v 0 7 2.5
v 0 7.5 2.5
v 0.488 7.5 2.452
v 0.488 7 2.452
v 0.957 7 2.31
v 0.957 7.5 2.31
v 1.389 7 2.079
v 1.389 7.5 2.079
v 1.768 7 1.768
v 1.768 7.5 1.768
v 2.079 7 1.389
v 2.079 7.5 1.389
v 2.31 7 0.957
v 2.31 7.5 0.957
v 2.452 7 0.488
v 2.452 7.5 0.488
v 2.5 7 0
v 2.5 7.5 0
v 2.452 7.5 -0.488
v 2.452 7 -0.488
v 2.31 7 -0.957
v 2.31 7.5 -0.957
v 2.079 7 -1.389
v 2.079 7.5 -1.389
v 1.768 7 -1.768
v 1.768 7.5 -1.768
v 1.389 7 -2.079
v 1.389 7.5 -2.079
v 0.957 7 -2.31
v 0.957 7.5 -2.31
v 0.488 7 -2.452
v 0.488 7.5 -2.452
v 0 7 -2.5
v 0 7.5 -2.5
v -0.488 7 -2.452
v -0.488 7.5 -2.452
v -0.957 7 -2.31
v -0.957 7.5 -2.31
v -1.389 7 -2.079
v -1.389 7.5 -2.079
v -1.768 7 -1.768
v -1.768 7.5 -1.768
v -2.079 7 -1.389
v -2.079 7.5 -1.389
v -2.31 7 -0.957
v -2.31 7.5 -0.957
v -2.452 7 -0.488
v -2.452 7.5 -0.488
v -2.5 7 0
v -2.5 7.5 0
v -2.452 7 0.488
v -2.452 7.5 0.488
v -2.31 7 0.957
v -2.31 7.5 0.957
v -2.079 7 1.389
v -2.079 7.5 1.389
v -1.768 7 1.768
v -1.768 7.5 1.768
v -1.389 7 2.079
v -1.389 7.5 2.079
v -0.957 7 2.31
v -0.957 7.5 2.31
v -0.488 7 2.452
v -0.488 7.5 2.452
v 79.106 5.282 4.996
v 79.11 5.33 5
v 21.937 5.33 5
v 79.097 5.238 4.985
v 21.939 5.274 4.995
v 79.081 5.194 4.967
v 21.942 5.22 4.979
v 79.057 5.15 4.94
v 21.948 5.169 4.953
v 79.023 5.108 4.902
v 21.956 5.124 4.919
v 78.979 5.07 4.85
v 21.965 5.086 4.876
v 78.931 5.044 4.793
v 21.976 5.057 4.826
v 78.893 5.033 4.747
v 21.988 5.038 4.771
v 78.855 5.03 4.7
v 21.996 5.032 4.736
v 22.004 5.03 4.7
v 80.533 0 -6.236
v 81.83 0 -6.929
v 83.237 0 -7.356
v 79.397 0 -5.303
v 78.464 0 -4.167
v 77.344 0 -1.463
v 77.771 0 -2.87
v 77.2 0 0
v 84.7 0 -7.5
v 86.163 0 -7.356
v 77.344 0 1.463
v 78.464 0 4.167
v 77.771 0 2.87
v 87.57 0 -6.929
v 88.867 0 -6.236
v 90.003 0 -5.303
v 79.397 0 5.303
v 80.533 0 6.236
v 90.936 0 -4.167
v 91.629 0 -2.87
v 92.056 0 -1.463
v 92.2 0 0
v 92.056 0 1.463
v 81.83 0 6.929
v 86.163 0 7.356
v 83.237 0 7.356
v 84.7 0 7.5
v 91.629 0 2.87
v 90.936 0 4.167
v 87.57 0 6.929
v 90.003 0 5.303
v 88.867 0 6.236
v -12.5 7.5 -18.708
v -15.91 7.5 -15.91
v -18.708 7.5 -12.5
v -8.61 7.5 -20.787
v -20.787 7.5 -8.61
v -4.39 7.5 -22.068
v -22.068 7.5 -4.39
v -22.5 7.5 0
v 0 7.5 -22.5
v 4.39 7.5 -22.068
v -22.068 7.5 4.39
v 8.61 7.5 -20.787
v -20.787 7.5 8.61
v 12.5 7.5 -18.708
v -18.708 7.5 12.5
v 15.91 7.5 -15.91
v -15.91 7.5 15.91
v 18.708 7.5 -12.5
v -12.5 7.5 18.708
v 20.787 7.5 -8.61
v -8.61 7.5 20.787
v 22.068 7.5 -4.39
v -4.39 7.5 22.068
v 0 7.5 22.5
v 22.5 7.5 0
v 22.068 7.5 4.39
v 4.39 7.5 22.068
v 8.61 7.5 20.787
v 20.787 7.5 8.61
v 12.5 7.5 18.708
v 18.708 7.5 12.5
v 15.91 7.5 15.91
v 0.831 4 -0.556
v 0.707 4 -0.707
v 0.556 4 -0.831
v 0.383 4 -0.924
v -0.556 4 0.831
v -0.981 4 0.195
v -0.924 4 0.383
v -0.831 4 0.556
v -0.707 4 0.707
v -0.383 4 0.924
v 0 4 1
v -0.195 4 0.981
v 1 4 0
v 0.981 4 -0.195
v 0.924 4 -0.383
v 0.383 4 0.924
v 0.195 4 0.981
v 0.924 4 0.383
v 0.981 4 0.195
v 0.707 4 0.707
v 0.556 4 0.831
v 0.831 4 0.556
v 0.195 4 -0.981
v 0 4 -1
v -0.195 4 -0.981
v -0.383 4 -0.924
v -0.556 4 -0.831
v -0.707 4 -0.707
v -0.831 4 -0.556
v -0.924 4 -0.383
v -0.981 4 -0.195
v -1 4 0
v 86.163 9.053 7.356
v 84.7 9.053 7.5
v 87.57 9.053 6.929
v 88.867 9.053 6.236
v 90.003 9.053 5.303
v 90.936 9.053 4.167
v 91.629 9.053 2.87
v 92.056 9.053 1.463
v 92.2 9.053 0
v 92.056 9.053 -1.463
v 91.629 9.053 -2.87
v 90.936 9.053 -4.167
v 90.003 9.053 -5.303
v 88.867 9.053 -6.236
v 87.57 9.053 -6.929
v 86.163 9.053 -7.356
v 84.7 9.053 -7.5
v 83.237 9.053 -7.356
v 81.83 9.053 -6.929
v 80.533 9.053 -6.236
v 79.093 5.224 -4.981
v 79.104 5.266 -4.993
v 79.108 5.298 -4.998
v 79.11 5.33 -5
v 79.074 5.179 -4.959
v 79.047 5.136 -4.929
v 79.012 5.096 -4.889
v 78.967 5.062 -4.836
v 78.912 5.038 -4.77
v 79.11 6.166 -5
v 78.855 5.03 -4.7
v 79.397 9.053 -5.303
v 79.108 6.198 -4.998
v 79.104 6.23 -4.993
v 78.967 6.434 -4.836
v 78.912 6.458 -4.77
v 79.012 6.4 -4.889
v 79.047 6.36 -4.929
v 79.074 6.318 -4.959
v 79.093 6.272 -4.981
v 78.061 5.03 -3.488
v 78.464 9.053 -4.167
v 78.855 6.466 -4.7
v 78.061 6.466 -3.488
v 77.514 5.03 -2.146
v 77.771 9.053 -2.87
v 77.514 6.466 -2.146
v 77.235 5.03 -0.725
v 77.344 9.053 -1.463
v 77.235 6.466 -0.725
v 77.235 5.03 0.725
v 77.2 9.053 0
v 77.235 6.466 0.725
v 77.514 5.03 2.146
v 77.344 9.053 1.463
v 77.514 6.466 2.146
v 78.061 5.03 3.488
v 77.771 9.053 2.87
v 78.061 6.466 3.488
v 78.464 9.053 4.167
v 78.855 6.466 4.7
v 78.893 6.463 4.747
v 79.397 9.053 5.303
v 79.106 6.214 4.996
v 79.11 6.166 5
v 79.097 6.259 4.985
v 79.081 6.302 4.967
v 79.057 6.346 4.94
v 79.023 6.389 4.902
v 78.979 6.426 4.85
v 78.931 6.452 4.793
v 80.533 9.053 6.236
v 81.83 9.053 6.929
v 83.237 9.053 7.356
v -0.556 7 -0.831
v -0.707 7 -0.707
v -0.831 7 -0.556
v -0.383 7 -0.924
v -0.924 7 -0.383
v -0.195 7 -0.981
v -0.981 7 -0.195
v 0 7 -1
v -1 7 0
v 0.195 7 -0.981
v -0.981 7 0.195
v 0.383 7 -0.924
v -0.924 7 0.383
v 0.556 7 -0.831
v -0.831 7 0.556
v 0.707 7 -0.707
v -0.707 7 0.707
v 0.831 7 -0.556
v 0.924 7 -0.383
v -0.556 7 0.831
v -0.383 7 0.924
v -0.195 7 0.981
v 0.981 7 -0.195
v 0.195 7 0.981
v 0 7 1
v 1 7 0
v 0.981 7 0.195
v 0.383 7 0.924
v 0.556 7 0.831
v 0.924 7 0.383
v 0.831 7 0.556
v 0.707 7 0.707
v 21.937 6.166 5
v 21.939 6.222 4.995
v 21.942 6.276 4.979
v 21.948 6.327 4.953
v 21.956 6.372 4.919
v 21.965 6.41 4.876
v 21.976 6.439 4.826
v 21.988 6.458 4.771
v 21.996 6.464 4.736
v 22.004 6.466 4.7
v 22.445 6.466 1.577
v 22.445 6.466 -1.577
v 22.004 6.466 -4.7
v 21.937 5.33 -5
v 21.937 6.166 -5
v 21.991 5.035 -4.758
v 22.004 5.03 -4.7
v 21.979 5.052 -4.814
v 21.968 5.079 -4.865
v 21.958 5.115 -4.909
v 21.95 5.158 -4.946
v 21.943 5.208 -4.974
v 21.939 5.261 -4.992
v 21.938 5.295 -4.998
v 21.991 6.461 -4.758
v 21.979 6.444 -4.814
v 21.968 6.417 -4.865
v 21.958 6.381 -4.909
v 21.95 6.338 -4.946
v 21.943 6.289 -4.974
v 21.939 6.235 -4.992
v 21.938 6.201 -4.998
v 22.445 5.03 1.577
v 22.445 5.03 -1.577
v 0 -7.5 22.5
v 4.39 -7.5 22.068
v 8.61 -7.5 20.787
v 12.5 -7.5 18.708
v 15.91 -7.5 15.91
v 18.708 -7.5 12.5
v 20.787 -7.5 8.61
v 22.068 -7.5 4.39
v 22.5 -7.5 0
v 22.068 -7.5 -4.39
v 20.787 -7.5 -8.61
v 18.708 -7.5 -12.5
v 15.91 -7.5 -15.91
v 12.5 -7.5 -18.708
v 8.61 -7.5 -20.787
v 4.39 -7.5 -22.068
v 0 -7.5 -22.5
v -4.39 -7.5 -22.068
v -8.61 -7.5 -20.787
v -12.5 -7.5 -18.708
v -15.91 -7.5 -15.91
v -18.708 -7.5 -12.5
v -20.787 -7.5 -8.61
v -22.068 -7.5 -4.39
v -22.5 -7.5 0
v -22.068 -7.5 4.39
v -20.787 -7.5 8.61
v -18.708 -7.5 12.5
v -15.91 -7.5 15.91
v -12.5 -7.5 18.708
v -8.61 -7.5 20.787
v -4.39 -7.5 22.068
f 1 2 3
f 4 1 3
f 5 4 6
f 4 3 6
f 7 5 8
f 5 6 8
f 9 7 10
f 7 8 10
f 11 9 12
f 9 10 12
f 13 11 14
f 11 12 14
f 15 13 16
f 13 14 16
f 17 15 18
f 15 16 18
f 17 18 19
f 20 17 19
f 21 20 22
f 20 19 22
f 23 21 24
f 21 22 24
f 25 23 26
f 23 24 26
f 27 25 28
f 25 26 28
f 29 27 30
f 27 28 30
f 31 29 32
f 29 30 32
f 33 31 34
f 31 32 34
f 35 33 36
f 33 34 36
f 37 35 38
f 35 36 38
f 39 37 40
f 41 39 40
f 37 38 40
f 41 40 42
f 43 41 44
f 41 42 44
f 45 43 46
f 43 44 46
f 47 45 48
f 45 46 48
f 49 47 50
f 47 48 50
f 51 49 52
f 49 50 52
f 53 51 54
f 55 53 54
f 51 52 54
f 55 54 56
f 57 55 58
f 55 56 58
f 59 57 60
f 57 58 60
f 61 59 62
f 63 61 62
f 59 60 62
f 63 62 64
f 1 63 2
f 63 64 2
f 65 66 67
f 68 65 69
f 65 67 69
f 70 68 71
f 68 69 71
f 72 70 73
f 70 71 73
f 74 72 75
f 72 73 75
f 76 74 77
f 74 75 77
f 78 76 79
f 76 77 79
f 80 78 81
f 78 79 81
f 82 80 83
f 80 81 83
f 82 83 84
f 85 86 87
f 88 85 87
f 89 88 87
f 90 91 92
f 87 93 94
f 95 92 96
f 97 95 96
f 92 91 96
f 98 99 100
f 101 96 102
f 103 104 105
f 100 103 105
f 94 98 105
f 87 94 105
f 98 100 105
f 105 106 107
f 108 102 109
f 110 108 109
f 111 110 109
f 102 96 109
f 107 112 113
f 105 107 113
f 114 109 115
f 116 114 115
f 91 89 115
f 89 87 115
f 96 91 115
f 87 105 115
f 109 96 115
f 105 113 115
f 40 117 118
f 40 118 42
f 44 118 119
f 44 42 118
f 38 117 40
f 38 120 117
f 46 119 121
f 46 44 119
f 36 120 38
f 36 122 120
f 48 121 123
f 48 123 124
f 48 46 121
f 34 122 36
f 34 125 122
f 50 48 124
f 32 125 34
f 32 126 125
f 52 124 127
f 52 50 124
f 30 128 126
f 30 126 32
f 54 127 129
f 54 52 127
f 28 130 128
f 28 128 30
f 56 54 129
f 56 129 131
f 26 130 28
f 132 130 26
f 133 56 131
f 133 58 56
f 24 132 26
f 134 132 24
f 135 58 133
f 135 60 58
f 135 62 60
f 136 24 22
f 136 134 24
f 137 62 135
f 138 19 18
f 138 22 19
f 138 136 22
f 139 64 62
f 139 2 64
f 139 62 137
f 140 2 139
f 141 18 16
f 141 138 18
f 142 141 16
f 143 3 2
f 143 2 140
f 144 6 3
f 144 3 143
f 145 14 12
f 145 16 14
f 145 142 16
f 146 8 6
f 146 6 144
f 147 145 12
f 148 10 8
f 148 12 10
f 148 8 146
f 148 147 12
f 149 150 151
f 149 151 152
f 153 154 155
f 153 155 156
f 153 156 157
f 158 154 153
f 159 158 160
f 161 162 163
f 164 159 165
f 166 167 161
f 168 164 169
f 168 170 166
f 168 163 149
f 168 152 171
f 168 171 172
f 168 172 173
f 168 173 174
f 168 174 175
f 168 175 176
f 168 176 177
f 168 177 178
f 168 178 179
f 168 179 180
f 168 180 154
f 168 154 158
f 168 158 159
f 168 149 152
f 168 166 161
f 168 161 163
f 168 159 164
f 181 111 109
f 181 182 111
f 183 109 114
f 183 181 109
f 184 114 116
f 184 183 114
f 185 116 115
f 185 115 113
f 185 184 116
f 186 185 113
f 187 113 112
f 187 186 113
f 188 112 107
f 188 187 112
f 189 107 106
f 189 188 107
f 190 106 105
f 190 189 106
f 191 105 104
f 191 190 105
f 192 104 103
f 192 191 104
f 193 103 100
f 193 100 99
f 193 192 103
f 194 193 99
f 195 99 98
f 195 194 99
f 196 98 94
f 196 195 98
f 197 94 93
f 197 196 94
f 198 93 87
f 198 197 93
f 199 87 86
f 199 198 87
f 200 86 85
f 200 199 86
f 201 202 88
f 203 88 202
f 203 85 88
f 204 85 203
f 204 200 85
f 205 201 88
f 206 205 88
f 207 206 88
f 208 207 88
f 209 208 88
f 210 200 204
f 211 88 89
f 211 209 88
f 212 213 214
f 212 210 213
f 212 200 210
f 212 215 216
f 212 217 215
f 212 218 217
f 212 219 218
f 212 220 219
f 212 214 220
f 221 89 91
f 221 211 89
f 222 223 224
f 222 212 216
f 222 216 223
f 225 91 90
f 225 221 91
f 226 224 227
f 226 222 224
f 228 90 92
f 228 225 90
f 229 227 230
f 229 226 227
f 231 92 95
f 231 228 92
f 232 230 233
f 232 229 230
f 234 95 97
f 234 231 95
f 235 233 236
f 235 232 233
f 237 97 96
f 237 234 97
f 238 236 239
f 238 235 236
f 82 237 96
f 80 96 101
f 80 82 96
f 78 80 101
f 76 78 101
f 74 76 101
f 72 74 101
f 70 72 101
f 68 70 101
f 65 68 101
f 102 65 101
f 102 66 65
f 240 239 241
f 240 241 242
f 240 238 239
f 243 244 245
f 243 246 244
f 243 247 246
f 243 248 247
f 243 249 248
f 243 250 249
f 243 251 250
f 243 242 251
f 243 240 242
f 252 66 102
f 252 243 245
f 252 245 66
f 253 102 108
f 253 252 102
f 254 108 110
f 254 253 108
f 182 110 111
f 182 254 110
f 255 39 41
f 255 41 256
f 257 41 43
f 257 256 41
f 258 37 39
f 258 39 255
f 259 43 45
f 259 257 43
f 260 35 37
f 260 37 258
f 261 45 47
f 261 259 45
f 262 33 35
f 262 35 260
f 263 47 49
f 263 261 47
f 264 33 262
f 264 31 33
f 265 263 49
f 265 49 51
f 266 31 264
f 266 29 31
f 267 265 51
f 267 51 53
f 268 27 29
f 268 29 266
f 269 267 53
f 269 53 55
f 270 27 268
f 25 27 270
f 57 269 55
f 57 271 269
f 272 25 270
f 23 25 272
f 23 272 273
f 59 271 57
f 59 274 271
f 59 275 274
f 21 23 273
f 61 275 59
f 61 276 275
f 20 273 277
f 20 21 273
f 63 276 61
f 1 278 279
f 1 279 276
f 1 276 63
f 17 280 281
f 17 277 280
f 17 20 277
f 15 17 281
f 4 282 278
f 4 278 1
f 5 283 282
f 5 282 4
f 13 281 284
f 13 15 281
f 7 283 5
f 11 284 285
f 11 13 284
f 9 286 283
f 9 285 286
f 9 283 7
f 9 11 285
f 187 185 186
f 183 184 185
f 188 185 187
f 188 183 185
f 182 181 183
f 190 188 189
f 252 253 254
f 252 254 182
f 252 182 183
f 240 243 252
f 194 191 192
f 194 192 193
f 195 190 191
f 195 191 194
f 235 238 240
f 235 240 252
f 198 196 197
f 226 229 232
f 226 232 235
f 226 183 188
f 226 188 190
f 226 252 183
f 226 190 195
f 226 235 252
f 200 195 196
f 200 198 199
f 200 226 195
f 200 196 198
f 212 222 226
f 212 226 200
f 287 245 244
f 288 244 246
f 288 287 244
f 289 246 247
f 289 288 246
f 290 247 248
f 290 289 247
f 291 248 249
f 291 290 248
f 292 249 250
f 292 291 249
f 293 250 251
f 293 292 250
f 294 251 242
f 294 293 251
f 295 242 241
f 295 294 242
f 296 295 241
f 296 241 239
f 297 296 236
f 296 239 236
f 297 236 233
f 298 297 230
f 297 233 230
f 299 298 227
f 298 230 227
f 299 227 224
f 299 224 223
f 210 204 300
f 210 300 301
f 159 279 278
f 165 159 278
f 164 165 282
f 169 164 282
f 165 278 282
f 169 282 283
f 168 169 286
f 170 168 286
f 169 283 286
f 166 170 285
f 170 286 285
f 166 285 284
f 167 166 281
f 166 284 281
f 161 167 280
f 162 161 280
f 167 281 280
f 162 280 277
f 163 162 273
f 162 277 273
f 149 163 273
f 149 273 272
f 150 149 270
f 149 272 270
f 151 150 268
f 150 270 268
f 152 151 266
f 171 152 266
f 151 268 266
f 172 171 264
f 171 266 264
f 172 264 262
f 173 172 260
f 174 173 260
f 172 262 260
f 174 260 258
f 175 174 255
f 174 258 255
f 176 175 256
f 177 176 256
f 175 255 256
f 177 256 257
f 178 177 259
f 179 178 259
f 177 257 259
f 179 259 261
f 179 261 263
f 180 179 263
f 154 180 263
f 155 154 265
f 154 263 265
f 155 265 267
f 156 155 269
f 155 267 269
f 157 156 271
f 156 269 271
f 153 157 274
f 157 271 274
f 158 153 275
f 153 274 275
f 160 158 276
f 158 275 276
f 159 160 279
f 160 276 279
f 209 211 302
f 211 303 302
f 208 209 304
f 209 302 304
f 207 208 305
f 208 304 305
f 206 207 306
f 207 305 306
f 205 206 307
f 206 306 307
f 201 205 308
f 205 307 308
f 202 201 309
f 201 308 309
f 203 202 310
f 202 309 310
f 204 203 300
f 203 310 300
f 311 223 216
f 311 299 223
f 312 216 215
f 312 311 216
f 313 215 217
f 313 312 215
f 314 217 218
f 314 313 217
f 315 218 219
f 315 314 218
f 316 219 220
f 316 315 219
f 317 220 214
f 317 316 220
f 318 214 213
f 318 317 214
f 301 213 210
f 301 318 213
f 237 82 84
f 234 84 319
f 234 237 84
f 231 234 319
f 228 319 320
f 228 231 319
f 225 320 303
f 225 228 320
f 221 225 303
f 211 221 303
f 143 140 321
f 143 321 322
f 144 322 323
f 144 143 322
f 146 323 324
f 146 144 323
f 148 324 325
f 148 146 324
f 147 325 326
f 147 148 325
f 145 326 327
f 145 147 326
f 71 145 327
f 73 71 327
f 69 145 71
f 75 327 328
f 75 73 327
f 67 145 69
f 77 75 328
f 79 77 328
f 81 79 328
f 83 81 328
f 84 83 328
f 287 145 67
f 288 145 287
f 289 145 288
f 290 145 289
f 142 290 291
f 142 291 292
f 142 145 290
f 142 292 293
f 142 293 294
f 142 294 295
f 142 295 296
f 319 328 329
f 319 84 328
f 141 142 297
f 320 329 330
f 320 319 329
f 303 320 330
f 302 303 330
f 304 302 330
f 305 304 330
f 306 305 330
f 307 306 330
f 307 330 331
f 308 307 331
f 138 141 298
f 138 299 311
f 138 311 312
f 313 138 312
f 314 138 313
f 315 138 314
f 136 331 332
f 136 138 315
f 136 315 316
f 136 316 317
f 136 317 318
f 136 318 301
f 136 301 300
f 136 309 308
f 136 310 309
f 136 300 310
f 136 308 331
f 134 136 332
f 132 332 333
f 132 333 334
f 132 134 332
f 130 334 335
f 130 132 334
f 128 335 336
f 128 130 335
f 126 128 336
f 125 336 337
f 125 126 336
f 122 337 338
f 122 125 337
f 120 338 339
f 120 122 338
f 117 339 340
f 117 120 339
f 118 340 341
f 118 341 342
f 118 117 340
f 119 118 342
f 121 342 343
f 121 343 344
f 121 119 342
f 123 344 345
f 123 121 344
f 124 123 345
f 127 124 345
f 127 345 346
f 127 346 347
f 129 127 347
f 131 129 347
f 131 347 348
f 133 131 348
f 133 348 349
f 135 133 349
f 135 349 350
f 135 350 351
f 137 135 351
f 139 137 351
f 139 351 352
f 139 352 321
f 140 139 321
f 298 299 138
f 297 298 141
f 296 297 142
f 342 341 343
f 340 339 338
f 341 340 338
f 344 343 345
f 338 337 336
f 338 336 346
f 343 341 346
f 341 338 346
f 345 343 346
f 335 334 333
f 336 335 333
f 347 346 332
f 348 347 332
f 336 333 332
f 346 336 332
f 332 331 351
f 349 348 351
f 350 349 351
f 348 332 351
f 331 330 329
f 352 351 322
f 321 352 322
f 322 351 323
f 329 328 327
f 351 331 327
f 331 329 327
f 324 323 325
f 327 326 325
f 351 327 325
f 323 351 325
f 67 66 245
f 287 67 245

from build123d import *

# Parameters (mm, degrees)
SKETCH_1_R           = 22.5
EXTRUDE_1_DEPTH      = 7.5
SKETCH_3_R           = 7.5
EXTRUDE_2_DEPTH      = 7.5
SKETCH_4_W           = 23.480524837
SKETCH_4_H           = 9.129078989
CUT_EXTRUDE_2_DEPTH  = 97.083765538
EXTRUDE_3_REACH      = 113.978
EXTRUDE_3_END_RADIUS = 22.5
SKETCH_5_W           = 10
SKETCH_5_H           = 1.436694835
SKETCH_6_R           = 2.5
CUT_EXTRUDE_3_DEPTH  = 0.5
SKETCH_7_R           = 1
CUT_EXTRUDE_4_DEPTH  = 3
FILLET_1_R           = 0.3


with BuildPart() as part:
    # 草图1 → 凸台-拉伸1 (new, symmetric)
    with BuildSketch(Plane(origin=(0, 0, 0), x_dir=(1, 0, 0), z_dir=(0, 1, 0))):
        with Locations(Location((0, 0, 0), (0, 0, 270))):
            Circle(SKETCH_1_R)
    extrude(amount=EXTRUDE_1_DEPTH, both=True)



with BuildPart() as body_2:
    # 草图3 → 凸台-拉伸2 (new, symmetric)
    with BuildSketch(Plane(origin=(0, 7.5, 0), x_dir=(1, 0, 0), z_dir=(0, 1, 0))):
        with Locations(Location((84.7, 0, 0), (0, 0, 270))):
            Circle(SKETCH_3_R)
    extrude(amount=EXTRUDE_2_DEPTH, both=True)

    # 草图4 → 切除-拉伸2 (cut, through all)
    with BuildSketch(Plane(origin=(0, 0, 0), x_dir=(0, 0, -1), z_dir=(1, 0, 0))):
        with Locations((0.499792143, 13.617320583)):
            Rectangle(SKETCH_4_W, SKETCH_4_H)
    extrude(amount=CUT_EXTRUDE_2_DEPTH, mode=Mode.SUBTRACT)


with BuildPart() as part_1:
    add(part.part)

    add(body_2.part)  # 凸台-拉伸3 merges body 2
    # 凸台-拉伸3: up to this cylinder (the profile starts outside it)
    extrude_3_end = Plane(origin=(0, 5.748089, 0), z_dir=(0, -1, 0)) * Cylinder(EXTRUDE_3_END_RADIUS, 273.956, mode=Mode.PRIVATE)
    # 草图5 → 凸台-拉伸3 (add, up to the surface)
    with BuildSketch(Plane(origin=(86.82, 0, 0), x_dir=(0, 0, -1), z_dir=(1, 0, 0)), mode=Mode.PRIVATE) as extrude_3_sk1:
        with Locations((0, 5.748089048)):
            Rectangle(SKETCH_5_W, SKETCH_5_H)
    extrude_3_tool1 = extrude(extrude_3_sk1.sketch, amount=-EXTRUDE_3_REACH, mode=Mode.PRIVATE) - extrude_3_end
    add(extrude_3_tool1.solids().sort_by_distance((86.82, 5.748089, 0))[0])

    # 草图6 → 切除-拉伸3 (cut)
    with BuildSketch(Plane(origin=(0, 7.5, 0), x_dir=(1, 0, 0), z_dir=(0, 1, 0))):
        with Locations(Location((0, 0, 0), (0, 0, 270))):
            Circle(SKETCH_6_R)
    extrude(amount=-CUT_EXTRUDE_3_DEPTH, mode=Mode.SUBTRACT)

    # 草图7 → 切除-拉伸4 (cut)
    with BuildSketch(Plane(origin=(0, 7, 0), x_dir=(1, 0, 0), z_dir=(0, 1, 0))):
        with Locations(Location((0, 0, 0), (0, 0, 270))):
            Circle(SKETCH_7_R)
    extrude(amount=-CUT_EXTRUDE_4_DEPTH, mode=Mode.SUBTRACT)

    # 圆角1
    fillet_1_edges = [part_1.edges().sort_by_distance(p)[0] for p in [
        (50.523620512, 6.466436465, 5),
        (50.523620512, 5.02974163, -5),
        (50.523620512, 5.02974163, 5),
        (50.523620512, 6.466436465, -5),
    ]]
    fillet(fillet_1_edges, radius=FILLET_1_R)


solid = part_1.part
